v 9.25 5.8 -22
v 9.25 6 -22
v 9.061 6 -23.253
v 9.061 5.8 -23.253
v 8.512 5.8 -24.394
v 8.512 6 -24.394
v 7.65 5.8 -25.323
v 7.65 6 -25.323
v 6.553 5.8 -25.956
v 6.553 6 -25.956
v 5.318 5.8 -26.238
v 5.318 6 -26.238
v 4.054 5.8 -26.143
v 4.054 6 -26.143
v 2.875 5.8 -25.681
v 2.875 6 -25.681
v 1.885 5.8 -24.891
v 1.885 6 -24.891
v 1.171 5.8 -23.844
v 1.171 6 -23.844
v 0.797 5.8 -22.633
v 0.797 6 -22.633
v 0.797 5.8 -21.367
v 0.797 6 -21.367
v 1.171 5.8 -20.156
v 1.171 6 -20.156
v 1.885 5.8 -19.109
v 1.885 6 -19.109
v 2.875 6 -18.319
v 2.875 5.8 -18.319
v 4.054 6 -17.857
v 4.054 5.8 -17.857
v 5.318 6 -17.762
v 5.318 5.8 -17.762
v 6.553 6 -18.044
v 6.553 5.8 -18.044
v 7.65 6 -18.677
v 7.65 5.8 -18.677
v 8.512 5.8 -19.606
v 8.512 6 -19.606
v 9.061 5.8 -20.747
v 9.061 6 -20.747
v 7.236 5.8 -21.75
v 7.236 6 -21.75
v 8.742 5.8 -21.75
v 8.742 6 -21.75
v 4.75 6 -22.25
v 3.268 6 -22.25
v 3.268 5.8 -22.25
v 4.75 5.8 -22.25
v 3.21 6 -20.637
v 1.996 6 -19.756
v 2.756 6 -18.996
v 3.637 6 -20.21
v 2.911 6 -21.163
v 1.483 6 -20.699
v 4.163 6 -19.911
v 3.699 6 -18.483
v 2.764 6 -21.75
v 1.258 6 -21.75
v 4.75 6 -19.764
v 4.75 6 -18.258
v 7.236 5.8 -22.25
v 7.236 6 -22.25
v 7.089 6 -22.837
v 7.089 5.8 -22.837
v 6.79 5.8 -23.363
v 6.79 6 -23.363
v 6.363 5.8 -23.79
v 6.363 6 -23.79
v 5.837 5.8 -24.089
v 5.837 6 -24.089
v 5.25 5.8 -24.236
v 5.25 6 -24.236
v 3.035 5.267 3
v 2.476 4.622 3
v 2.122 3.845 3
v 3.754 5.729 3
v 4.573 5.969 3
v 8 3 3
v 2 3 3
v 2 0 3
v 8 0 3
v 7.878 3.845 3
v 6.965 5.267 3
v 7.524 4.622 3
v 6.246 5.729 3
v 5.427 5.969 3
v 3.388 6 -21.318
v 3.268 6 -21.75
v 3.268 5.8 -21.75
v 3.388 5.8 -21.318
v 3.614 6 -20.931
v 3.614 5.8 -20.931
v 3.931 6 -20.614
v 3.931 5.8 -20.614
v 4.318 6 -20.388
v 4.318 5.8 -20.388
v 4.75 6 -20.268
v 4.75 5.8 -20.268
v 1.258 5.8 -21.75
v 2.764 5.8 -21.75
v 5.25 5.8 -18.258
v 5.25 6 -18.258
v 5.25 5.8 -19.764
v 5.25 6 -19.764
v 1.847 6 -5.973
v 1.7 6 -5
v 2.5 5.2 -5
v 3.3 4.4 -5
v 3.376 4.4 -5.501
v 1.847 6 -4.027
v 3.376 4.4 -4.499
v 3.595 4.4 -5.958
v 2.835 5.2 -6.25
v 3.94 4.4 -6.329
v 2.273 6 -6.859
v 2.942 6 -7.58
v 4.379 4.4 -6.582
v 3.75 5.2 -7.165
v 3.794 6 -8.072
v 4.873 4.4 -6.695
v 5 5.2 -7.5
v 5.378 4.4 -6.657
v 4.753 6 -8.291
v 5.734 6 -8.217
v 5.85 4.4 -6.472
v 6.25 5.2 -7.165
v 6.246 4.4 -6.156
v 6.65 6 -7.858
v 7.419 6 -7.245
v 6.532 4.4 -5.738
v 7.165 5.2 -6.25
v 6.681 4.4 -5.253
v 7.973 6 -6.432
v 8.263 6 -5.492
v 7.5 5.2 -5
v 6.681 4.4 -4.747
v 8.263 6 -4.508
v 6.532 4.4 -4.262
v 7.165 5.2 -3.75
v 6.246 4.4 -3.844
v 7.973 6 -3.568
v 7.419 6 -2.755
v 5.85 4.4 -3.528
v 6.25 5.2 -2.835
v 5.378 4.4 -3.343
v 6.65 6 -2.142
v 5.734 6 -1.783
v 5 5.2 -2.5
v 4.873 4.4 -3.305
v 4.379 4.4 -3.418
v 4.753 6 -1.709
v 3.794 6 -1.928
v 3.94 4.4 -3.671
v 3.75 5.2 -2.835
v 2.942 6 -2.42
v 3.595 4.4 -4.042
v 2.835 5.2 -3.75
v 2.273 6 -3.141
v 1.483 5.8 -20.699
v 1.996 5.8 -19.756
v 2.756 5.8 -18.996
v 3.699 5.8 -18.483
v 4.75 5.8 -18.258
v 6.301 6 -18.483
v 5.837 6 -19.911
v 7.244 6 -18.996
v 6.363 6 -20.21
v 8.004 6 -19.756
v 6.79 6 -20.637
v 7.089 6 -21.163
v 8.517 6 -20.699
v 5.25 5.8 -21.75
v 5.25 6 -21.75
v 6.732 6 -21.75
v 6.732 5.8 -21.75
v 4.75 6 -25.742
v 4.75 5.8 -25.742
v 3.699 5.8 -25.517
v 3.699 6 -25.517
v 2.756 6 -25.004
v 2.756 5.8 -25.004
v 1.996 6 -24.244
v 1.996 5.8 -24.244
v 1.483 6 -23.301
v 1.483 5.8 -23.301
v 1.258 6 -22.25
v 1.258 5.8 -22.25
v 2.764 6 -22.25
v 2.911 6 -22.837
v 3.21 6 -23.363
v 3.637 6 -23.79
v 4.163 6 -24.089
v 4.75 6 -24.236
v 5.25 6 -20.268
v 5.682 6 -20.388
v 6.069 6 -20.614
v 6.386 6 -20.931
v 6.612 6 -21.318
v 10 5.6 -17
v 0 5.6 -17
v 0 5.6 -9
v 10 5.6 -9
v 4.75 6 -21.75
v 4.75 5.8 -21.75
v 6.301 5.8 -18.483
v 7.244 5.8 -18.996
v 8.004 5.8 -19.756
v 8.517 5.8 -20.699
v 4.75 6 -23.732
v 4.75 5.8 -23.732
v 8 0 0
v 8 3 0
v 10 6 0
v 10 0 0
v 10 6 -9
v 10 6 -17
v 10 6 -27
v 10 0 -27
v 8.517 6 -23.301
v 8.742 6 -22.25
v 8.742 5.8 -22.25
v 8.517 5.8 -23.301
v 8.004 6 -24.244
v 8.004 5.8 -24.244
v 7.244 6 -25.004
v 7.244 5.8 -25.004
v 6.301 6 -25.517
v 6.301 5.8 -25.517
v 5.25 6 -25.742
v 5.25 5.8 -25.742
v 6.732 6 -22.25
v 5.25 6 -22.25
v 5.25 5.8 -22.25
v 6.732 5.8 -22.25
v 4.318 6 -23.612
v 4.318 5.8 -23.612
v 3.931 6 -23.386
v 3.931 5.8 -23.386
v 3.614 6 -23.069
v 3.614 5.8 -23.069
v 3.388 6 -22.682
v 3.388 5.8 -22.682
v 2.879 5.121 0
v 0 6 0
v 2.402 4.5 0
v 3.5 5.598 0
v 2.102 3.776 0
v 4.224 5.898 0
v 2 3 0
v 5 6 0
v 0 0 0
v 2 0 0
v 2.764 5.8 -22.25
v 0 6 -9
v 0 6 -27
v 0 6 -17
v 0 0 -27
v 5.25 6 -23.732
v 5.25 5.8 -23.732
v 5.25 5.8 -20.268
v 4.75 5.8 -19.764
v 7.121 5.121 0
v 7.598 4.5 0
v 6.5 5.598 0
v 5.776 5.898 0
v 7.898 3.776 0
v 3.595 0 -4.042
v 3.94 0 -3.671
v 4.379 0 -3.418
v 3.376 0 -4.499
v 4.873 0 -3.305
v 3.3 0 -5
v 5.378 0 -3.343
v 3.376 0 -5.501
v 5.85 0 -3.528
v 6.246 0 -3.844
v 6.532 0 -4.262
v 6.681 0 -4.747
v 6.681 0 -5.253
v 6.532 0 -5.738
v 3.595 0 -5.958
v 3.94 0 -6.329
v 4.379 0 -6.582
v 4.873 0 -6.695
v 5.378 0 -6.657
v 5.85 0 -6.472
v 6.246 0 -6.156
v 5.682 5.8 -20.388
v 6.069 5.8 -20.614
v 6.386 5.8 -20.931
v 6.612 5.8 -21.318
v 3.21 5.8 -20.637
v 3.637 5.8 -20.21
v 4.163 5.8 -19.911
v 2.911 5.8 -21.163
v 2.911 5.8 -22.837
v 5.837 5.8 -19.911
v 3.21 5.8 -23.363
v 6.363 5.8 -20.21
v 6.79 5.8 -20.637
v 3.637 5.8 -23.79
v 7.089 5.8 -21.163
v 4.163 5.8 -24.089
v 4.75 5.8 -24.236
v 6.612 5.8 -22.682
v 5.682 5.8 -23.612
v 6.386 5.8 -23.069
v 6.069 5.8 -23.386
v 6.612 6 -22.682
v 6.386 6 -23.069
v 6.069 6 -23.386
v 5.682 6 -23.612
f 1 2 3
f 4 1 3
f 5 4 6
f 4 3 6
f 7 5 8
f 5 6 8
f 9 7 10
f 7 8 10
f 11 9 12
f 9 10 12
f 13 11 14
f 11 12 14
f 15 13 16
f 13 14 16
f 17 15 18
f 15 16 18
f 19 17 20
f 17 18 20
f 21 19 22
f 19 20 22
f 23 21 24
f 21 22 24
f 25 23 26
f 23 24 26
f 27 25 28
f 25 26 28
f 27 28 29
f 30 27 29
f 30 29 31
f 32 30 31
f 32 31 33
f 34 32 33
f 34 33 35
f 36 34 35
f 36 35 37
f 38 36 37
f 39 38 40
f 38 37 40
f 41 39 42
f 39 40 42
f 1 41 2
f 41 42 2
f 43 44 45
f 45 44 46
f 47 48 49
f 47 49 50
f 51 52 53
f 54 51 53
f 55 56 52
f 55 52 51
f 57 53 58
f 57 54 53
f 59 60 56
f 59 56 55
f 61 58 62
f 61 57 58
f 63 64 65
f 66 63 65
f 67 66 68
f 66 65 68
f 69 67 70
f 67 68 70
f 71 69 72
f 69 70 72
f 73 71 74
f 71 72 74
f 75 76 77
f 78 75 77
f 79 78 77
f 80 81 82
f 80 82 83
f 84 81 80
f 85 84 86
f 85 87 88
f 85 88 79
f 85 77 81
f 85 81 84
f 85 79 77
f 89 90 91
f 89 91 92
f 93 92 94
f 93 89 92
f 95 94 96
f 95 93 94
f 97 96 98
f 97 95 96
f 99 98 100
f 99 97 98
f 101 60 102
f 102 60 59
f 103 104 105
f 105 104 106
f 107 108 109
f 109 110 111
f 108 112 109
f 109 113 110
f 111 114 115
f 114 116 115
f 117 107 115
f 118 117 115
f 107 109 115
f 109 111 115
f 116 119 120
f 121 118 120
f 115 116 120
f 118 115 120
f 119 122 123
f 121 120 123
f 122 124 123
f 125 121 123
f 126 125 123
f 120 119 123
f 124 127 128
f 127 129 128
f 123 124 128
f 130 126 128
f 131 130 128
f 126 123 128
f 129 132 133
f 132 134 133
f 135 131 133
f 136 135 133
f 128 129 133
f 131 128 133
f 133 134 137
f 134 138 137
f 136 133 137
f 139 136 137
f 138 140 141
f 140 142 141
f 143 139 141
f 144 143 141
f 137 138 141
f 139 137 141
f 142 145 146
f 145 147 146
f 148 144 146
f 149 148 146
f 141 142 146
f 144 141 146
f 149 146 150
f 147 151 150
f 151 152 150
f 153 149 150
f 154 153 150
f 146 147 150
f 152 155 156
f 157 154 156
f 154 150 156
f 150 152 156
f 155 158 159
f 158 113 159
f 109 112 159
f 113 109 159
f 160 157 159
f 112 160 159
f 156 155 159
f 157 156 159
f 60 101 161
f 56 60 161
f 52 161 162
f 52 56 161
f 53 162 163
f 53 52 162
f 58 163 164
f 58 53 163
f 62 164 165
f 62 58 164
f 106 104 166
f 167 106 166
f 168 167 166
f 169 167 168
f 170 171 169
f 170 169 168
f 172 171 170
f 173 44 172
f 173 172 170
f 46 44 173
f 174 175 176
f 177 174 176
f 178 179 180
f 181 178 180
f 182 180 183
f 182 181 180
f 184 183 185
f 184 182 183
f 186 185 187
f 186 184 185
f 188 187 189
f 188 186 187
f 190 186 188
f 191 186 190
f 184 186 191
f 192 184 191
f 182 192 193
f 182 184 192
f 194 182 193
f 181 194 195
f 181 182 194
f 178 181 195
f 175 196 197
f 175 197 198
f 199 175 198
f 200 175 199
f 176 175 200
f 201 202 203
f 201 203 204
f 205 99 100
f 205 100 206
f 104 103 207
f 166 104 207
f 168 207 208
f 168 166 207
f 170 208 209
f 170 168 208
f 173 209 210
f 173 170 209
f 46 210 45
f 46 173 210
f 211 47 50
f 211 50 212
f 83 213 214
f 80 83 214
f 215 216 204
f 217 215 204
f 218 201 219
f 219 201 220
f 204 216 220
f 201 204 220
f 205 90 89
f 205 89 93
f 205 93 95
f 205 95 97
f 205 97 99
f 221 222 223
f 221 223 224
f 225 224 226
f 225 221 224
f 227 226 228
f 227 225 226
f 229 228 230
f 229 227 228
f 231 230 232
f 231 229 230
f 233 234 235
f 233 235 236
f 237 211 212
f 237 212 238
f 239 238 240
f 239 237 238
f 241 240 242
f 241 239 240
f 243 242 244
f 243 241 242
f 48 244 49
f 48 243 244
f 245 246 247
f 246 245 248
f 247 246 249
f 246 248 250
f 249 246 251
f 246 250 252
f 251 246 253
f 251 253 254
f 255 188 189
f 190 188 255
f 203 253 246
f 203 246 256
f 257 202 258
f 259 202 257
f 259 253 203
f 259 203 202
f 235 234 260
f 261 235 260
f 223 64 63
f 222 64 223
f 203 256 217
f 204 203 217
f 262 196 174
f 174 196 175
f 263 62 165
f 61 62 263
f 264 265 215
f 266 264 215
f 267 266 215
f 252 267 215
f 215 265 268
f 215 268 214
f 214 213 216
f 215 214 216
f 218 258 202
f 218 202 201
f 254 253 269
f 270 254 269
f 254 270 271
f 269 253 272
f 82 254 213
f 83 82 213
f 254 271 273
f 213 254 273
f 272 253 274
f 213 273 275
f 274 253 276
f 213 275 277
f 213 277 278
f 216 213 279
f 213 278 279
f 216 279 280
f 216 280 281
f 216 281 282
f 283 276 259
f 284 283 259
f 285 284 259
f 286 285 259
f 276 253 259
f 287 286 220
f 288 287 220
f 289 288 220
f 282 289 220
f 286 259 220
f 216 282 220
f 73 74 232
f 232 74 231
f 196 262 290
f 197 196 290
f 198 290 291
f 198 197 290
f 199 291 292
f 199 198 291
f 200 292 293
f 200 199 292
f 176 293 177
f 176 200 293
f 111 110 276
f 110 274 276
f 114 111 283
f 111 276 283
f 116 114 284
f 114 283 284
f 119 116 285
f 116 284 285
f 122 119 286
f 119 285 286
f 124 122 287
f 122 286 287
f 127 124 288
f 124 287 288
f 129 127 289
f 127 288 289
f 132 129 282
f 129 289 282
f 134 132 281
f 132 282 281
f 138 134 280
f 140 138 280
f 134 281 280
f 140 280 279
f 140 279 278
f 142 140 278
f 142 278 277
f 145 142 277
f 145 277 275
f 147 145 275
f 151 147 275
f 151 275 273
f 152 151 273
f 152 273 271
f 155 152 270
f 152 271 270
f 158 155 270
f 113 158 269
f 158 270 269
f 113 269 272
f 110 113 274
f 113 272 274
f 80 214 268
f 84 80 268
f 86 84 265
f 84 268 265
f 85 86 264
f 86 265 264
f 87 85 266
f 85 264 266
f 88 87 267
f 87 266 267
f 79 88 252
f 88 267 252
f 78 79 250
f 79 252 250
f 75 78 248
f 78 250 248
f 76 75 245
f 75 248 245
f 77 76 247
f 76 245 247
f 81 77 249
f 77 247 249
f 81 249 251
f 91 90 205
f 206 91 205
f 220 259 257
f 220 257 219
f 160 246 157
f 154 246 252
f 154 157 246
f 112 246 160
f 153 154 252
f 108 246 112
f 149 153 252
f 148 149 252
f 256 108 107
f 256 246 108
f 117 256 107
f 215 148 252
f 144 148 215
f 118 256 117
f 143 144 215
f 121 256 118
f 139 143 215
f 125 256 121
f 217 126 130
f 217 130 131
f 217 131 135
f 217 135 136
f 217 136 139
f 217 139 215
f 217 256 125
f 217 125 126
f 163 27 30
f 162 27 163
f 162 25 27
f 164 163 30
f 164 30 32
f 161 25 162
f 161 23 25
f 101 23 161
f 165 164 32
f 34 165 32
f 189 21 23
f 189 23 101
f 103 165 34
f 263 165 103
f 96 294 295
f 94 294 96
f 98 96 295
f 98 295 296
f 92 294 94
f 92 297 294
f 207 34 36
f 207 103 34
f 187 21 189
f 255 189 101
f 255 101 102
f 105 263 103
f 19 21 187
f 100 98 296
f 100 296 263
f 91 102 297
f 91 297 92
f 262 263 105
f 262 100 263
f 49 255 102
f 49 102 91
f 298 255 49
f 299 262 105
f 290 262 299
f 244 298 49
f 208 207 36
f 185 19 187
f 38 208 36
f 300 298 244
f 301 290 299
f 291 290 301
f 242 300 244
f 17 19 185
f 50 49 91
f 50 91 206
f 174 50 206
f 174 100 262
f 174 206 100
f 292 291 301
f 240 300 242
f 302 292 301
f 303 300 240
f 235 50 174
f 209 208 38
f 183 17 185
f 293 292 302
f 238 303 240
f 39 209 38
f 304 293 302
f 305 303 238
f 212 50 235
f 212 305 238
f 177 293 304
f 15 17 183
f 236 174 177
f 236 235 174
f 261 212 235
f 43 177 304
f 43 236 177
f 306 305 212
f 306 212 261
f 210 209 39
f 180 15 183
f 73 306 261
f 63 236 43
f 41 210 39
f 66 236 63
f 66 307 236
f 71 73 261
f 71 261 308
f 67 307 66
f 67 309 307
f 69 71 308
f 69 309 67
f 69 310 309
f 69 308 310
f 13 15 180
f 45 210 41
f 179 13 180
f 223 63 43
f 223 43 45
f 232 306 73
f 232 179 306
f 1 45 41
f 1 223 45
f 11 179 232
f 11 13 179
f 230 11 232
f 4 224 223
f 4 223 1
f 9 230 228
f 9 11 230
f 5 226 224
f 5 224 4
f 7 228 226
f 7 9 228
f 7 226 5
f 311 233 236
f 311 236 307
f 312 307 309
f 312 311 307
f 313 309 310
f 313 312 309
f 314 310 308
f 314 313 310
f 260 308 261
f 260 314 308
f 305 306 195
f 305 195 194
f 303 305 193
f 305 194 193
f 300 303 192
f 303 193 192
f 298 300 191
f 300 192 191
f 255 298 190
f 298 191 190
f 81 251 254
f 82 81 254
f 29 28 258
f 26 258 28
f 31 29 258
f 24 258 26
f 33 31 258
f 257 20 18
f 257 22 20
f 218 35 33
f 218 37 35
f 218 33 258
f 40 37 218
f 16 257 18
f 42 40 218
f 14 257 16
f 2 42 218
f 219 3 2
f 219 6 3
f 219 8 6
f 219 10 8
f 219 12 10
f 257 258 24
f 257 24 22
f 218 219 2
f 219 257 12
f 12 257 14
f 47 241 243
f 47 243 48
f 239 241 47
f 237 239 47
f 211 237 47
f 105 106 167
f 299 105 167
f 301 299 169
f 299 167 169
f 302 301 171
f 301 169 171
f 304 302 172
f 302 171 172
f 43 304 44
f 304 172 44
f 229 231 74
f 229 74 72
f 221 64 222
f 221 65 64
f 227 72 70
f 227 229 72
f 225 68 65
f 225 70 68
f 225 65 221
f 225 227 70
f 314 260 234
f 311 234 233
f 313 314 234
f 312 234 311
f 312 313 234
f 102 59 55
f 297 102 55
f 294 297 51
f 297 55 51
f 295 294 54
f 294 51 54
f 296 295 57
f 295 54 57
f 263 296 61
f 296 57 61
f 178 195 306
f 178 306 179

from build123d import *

# Parameters (mm, degrees)
SKETCH_1_W                = 10
SKETCH_1_H                = 27
SKETCH_1_R                = 1.5
EXTRUDE_1_DEPTH           = 6
SKETCH_2_R                = 4.25
SKETCH_2_R_2              = 3.75
SKETCH_2_R_3              = 2.25
SKETCH_2_R_4              = 1.75
SKETCH_2_W                = 8
SKETCH_2_H                = 0.5
SKETCH_2_W_2              = 0.5
SKETCH_2_H_2              = 8
CUT_EXTRUDE_1_DEPTH       = 0.2
SKETCH_3_W                = 10
SKETCH_3_H                = 8
CUT_EXTRUDE_1_2_DEPTH     = 0.4
HOLE_WIZARD_1_D           = 3.4
HOLE_WIZARD_1_DEPTH       = 22.25
HOLE_WIZARD_1_CSINK_D     = 6.6
HOLE_WIZARD_1_CSINK_ANGLE = 90
HOLE_WIZARD_1_TIP         = 1.021463052
EXTRUDE_2_DEPTH           = 3


with BuildPart() as part:
    # 草图1 → 凸台-拉伸1 (new body)
    with BuildSketch(Plane(origin=(0, 0, 0), x_dir=(1, 0, 0), z_dir=(0, 1, 0))):
        with Locations((5, 13.5)):
            Rectangle(SKETCH_1_W, SKETCH_1_H)
        with Locations(Location((5, 5, 0), (0, 0, 270))):
            Circle(SKETCH_1_R, mode=Mode.SUBTRACT)
    extrude(amount=EXTRUDE_1_DEPTH)

    # 草图2 → Cut-Extrude 1 (cut)
    # profile 1 of 4: a face of its own
    with BuildSketch(Plane(origin=(0, 6, 0), x_dir=(1, 0, 0), z_dir=(0, 1, 0))):
        with Locations((5, 22)):
            Circle(SKETCH_2_R)
        with Locations((5, 22)):
            Circle(SKETCH_2_R_2, mode=Mode.SUBTRACT)
    # profile 2 of 4: a face of its own
    with BuildSketch(Plane(origin=(0, 6, 0), x_dir=(1, 0, 0), z_dir=(0, 1, 0))):
        with Locations((5, 22)):
            Circle(SKETCH_2_R_3)
        with Locations((5, 22)):
            Circle(SKETCH_2_R_4, mode=Mode.SUBTRACT)
    # profile 3 of 4: a face of its own
    with BuildSketch(Plane(origin=(0, 6, 0), x_dir=(1, 0, 0), z_dir=(0, 1, 0))):
        with Locations((5, 22)):
            Rectangle(SKETCH_2_W, SKETCH_2_H)
    # profile 4 of 4: a face of its own
    with BuildSketch(Plane(origin=(0, 6, 0), x_dir=(1, 0, 0), z_dir=(0, 1, 0))):
        with Locations((5, 22)):
            Rectangle(SKETCH_2_W_2, SKETCH_2_H_2)
    extrude(amount=-CUT_EXTRUDE_1_DEPTH, mode=Mode.SUBTRACT)

    # 草图3 → Cut-Extrude 1 2 (cut)
    with BuildSketch(Plane(origin=(0, 6, 0), x_dir=(1, 0, 0), z_dir=(0, 1, 0))):
        with Locations((5, 13)):
            Rectangle(SKETCH_3_W, SKETCH_3_H)
    extrude(amount=-CUT_EXTRUDE_1_2_DEPTH, mode=Mode.SUBTRACT)

    # 打孔尺寸(%根据十字)槽半沉头木螺钉的类型1
    with Locations(Plane(origin=(0, 6, 0), x_dir=(1, 0, 0), z_dir=(0, 1, 0))):
        with Locations((5, 5)):
            CounterSinkHole(HOLE_WIZARD_1_D / 2, HOLE_WIZARD_1_CSINK_D / 2, depth=HOLE_WIZARD_1_DEPTH, counter_sink_angle=HOLE_WIZARD_1_CSINK_ANGLE)
            with Locations((0, 0, -(HOLE_WIZARD_1_DEPTH + HOLE_WIZARD_1_TIP / 2))):  # 118° drill point
                Cone(0, HOLE_WIZARD_1_D / 2, HOLE_WIZARD_1_TIP, mode=Mode.SUBTRACT)

    # 草图6 → 凸台-拉伸2 (add)
    with BuildSketch(Plane.XY):
        with BuildLine():
            Line((2, 3), (2, 0))
            Line((2, 0), (8, 0))
            Line((8, 0), (8, 3))
            ThreePointArc((8, 3), (5, 6), (2, 3))
        make_face()
    extrude(amount=EXTRUDE_2_DEPTH)


solid = part.part
